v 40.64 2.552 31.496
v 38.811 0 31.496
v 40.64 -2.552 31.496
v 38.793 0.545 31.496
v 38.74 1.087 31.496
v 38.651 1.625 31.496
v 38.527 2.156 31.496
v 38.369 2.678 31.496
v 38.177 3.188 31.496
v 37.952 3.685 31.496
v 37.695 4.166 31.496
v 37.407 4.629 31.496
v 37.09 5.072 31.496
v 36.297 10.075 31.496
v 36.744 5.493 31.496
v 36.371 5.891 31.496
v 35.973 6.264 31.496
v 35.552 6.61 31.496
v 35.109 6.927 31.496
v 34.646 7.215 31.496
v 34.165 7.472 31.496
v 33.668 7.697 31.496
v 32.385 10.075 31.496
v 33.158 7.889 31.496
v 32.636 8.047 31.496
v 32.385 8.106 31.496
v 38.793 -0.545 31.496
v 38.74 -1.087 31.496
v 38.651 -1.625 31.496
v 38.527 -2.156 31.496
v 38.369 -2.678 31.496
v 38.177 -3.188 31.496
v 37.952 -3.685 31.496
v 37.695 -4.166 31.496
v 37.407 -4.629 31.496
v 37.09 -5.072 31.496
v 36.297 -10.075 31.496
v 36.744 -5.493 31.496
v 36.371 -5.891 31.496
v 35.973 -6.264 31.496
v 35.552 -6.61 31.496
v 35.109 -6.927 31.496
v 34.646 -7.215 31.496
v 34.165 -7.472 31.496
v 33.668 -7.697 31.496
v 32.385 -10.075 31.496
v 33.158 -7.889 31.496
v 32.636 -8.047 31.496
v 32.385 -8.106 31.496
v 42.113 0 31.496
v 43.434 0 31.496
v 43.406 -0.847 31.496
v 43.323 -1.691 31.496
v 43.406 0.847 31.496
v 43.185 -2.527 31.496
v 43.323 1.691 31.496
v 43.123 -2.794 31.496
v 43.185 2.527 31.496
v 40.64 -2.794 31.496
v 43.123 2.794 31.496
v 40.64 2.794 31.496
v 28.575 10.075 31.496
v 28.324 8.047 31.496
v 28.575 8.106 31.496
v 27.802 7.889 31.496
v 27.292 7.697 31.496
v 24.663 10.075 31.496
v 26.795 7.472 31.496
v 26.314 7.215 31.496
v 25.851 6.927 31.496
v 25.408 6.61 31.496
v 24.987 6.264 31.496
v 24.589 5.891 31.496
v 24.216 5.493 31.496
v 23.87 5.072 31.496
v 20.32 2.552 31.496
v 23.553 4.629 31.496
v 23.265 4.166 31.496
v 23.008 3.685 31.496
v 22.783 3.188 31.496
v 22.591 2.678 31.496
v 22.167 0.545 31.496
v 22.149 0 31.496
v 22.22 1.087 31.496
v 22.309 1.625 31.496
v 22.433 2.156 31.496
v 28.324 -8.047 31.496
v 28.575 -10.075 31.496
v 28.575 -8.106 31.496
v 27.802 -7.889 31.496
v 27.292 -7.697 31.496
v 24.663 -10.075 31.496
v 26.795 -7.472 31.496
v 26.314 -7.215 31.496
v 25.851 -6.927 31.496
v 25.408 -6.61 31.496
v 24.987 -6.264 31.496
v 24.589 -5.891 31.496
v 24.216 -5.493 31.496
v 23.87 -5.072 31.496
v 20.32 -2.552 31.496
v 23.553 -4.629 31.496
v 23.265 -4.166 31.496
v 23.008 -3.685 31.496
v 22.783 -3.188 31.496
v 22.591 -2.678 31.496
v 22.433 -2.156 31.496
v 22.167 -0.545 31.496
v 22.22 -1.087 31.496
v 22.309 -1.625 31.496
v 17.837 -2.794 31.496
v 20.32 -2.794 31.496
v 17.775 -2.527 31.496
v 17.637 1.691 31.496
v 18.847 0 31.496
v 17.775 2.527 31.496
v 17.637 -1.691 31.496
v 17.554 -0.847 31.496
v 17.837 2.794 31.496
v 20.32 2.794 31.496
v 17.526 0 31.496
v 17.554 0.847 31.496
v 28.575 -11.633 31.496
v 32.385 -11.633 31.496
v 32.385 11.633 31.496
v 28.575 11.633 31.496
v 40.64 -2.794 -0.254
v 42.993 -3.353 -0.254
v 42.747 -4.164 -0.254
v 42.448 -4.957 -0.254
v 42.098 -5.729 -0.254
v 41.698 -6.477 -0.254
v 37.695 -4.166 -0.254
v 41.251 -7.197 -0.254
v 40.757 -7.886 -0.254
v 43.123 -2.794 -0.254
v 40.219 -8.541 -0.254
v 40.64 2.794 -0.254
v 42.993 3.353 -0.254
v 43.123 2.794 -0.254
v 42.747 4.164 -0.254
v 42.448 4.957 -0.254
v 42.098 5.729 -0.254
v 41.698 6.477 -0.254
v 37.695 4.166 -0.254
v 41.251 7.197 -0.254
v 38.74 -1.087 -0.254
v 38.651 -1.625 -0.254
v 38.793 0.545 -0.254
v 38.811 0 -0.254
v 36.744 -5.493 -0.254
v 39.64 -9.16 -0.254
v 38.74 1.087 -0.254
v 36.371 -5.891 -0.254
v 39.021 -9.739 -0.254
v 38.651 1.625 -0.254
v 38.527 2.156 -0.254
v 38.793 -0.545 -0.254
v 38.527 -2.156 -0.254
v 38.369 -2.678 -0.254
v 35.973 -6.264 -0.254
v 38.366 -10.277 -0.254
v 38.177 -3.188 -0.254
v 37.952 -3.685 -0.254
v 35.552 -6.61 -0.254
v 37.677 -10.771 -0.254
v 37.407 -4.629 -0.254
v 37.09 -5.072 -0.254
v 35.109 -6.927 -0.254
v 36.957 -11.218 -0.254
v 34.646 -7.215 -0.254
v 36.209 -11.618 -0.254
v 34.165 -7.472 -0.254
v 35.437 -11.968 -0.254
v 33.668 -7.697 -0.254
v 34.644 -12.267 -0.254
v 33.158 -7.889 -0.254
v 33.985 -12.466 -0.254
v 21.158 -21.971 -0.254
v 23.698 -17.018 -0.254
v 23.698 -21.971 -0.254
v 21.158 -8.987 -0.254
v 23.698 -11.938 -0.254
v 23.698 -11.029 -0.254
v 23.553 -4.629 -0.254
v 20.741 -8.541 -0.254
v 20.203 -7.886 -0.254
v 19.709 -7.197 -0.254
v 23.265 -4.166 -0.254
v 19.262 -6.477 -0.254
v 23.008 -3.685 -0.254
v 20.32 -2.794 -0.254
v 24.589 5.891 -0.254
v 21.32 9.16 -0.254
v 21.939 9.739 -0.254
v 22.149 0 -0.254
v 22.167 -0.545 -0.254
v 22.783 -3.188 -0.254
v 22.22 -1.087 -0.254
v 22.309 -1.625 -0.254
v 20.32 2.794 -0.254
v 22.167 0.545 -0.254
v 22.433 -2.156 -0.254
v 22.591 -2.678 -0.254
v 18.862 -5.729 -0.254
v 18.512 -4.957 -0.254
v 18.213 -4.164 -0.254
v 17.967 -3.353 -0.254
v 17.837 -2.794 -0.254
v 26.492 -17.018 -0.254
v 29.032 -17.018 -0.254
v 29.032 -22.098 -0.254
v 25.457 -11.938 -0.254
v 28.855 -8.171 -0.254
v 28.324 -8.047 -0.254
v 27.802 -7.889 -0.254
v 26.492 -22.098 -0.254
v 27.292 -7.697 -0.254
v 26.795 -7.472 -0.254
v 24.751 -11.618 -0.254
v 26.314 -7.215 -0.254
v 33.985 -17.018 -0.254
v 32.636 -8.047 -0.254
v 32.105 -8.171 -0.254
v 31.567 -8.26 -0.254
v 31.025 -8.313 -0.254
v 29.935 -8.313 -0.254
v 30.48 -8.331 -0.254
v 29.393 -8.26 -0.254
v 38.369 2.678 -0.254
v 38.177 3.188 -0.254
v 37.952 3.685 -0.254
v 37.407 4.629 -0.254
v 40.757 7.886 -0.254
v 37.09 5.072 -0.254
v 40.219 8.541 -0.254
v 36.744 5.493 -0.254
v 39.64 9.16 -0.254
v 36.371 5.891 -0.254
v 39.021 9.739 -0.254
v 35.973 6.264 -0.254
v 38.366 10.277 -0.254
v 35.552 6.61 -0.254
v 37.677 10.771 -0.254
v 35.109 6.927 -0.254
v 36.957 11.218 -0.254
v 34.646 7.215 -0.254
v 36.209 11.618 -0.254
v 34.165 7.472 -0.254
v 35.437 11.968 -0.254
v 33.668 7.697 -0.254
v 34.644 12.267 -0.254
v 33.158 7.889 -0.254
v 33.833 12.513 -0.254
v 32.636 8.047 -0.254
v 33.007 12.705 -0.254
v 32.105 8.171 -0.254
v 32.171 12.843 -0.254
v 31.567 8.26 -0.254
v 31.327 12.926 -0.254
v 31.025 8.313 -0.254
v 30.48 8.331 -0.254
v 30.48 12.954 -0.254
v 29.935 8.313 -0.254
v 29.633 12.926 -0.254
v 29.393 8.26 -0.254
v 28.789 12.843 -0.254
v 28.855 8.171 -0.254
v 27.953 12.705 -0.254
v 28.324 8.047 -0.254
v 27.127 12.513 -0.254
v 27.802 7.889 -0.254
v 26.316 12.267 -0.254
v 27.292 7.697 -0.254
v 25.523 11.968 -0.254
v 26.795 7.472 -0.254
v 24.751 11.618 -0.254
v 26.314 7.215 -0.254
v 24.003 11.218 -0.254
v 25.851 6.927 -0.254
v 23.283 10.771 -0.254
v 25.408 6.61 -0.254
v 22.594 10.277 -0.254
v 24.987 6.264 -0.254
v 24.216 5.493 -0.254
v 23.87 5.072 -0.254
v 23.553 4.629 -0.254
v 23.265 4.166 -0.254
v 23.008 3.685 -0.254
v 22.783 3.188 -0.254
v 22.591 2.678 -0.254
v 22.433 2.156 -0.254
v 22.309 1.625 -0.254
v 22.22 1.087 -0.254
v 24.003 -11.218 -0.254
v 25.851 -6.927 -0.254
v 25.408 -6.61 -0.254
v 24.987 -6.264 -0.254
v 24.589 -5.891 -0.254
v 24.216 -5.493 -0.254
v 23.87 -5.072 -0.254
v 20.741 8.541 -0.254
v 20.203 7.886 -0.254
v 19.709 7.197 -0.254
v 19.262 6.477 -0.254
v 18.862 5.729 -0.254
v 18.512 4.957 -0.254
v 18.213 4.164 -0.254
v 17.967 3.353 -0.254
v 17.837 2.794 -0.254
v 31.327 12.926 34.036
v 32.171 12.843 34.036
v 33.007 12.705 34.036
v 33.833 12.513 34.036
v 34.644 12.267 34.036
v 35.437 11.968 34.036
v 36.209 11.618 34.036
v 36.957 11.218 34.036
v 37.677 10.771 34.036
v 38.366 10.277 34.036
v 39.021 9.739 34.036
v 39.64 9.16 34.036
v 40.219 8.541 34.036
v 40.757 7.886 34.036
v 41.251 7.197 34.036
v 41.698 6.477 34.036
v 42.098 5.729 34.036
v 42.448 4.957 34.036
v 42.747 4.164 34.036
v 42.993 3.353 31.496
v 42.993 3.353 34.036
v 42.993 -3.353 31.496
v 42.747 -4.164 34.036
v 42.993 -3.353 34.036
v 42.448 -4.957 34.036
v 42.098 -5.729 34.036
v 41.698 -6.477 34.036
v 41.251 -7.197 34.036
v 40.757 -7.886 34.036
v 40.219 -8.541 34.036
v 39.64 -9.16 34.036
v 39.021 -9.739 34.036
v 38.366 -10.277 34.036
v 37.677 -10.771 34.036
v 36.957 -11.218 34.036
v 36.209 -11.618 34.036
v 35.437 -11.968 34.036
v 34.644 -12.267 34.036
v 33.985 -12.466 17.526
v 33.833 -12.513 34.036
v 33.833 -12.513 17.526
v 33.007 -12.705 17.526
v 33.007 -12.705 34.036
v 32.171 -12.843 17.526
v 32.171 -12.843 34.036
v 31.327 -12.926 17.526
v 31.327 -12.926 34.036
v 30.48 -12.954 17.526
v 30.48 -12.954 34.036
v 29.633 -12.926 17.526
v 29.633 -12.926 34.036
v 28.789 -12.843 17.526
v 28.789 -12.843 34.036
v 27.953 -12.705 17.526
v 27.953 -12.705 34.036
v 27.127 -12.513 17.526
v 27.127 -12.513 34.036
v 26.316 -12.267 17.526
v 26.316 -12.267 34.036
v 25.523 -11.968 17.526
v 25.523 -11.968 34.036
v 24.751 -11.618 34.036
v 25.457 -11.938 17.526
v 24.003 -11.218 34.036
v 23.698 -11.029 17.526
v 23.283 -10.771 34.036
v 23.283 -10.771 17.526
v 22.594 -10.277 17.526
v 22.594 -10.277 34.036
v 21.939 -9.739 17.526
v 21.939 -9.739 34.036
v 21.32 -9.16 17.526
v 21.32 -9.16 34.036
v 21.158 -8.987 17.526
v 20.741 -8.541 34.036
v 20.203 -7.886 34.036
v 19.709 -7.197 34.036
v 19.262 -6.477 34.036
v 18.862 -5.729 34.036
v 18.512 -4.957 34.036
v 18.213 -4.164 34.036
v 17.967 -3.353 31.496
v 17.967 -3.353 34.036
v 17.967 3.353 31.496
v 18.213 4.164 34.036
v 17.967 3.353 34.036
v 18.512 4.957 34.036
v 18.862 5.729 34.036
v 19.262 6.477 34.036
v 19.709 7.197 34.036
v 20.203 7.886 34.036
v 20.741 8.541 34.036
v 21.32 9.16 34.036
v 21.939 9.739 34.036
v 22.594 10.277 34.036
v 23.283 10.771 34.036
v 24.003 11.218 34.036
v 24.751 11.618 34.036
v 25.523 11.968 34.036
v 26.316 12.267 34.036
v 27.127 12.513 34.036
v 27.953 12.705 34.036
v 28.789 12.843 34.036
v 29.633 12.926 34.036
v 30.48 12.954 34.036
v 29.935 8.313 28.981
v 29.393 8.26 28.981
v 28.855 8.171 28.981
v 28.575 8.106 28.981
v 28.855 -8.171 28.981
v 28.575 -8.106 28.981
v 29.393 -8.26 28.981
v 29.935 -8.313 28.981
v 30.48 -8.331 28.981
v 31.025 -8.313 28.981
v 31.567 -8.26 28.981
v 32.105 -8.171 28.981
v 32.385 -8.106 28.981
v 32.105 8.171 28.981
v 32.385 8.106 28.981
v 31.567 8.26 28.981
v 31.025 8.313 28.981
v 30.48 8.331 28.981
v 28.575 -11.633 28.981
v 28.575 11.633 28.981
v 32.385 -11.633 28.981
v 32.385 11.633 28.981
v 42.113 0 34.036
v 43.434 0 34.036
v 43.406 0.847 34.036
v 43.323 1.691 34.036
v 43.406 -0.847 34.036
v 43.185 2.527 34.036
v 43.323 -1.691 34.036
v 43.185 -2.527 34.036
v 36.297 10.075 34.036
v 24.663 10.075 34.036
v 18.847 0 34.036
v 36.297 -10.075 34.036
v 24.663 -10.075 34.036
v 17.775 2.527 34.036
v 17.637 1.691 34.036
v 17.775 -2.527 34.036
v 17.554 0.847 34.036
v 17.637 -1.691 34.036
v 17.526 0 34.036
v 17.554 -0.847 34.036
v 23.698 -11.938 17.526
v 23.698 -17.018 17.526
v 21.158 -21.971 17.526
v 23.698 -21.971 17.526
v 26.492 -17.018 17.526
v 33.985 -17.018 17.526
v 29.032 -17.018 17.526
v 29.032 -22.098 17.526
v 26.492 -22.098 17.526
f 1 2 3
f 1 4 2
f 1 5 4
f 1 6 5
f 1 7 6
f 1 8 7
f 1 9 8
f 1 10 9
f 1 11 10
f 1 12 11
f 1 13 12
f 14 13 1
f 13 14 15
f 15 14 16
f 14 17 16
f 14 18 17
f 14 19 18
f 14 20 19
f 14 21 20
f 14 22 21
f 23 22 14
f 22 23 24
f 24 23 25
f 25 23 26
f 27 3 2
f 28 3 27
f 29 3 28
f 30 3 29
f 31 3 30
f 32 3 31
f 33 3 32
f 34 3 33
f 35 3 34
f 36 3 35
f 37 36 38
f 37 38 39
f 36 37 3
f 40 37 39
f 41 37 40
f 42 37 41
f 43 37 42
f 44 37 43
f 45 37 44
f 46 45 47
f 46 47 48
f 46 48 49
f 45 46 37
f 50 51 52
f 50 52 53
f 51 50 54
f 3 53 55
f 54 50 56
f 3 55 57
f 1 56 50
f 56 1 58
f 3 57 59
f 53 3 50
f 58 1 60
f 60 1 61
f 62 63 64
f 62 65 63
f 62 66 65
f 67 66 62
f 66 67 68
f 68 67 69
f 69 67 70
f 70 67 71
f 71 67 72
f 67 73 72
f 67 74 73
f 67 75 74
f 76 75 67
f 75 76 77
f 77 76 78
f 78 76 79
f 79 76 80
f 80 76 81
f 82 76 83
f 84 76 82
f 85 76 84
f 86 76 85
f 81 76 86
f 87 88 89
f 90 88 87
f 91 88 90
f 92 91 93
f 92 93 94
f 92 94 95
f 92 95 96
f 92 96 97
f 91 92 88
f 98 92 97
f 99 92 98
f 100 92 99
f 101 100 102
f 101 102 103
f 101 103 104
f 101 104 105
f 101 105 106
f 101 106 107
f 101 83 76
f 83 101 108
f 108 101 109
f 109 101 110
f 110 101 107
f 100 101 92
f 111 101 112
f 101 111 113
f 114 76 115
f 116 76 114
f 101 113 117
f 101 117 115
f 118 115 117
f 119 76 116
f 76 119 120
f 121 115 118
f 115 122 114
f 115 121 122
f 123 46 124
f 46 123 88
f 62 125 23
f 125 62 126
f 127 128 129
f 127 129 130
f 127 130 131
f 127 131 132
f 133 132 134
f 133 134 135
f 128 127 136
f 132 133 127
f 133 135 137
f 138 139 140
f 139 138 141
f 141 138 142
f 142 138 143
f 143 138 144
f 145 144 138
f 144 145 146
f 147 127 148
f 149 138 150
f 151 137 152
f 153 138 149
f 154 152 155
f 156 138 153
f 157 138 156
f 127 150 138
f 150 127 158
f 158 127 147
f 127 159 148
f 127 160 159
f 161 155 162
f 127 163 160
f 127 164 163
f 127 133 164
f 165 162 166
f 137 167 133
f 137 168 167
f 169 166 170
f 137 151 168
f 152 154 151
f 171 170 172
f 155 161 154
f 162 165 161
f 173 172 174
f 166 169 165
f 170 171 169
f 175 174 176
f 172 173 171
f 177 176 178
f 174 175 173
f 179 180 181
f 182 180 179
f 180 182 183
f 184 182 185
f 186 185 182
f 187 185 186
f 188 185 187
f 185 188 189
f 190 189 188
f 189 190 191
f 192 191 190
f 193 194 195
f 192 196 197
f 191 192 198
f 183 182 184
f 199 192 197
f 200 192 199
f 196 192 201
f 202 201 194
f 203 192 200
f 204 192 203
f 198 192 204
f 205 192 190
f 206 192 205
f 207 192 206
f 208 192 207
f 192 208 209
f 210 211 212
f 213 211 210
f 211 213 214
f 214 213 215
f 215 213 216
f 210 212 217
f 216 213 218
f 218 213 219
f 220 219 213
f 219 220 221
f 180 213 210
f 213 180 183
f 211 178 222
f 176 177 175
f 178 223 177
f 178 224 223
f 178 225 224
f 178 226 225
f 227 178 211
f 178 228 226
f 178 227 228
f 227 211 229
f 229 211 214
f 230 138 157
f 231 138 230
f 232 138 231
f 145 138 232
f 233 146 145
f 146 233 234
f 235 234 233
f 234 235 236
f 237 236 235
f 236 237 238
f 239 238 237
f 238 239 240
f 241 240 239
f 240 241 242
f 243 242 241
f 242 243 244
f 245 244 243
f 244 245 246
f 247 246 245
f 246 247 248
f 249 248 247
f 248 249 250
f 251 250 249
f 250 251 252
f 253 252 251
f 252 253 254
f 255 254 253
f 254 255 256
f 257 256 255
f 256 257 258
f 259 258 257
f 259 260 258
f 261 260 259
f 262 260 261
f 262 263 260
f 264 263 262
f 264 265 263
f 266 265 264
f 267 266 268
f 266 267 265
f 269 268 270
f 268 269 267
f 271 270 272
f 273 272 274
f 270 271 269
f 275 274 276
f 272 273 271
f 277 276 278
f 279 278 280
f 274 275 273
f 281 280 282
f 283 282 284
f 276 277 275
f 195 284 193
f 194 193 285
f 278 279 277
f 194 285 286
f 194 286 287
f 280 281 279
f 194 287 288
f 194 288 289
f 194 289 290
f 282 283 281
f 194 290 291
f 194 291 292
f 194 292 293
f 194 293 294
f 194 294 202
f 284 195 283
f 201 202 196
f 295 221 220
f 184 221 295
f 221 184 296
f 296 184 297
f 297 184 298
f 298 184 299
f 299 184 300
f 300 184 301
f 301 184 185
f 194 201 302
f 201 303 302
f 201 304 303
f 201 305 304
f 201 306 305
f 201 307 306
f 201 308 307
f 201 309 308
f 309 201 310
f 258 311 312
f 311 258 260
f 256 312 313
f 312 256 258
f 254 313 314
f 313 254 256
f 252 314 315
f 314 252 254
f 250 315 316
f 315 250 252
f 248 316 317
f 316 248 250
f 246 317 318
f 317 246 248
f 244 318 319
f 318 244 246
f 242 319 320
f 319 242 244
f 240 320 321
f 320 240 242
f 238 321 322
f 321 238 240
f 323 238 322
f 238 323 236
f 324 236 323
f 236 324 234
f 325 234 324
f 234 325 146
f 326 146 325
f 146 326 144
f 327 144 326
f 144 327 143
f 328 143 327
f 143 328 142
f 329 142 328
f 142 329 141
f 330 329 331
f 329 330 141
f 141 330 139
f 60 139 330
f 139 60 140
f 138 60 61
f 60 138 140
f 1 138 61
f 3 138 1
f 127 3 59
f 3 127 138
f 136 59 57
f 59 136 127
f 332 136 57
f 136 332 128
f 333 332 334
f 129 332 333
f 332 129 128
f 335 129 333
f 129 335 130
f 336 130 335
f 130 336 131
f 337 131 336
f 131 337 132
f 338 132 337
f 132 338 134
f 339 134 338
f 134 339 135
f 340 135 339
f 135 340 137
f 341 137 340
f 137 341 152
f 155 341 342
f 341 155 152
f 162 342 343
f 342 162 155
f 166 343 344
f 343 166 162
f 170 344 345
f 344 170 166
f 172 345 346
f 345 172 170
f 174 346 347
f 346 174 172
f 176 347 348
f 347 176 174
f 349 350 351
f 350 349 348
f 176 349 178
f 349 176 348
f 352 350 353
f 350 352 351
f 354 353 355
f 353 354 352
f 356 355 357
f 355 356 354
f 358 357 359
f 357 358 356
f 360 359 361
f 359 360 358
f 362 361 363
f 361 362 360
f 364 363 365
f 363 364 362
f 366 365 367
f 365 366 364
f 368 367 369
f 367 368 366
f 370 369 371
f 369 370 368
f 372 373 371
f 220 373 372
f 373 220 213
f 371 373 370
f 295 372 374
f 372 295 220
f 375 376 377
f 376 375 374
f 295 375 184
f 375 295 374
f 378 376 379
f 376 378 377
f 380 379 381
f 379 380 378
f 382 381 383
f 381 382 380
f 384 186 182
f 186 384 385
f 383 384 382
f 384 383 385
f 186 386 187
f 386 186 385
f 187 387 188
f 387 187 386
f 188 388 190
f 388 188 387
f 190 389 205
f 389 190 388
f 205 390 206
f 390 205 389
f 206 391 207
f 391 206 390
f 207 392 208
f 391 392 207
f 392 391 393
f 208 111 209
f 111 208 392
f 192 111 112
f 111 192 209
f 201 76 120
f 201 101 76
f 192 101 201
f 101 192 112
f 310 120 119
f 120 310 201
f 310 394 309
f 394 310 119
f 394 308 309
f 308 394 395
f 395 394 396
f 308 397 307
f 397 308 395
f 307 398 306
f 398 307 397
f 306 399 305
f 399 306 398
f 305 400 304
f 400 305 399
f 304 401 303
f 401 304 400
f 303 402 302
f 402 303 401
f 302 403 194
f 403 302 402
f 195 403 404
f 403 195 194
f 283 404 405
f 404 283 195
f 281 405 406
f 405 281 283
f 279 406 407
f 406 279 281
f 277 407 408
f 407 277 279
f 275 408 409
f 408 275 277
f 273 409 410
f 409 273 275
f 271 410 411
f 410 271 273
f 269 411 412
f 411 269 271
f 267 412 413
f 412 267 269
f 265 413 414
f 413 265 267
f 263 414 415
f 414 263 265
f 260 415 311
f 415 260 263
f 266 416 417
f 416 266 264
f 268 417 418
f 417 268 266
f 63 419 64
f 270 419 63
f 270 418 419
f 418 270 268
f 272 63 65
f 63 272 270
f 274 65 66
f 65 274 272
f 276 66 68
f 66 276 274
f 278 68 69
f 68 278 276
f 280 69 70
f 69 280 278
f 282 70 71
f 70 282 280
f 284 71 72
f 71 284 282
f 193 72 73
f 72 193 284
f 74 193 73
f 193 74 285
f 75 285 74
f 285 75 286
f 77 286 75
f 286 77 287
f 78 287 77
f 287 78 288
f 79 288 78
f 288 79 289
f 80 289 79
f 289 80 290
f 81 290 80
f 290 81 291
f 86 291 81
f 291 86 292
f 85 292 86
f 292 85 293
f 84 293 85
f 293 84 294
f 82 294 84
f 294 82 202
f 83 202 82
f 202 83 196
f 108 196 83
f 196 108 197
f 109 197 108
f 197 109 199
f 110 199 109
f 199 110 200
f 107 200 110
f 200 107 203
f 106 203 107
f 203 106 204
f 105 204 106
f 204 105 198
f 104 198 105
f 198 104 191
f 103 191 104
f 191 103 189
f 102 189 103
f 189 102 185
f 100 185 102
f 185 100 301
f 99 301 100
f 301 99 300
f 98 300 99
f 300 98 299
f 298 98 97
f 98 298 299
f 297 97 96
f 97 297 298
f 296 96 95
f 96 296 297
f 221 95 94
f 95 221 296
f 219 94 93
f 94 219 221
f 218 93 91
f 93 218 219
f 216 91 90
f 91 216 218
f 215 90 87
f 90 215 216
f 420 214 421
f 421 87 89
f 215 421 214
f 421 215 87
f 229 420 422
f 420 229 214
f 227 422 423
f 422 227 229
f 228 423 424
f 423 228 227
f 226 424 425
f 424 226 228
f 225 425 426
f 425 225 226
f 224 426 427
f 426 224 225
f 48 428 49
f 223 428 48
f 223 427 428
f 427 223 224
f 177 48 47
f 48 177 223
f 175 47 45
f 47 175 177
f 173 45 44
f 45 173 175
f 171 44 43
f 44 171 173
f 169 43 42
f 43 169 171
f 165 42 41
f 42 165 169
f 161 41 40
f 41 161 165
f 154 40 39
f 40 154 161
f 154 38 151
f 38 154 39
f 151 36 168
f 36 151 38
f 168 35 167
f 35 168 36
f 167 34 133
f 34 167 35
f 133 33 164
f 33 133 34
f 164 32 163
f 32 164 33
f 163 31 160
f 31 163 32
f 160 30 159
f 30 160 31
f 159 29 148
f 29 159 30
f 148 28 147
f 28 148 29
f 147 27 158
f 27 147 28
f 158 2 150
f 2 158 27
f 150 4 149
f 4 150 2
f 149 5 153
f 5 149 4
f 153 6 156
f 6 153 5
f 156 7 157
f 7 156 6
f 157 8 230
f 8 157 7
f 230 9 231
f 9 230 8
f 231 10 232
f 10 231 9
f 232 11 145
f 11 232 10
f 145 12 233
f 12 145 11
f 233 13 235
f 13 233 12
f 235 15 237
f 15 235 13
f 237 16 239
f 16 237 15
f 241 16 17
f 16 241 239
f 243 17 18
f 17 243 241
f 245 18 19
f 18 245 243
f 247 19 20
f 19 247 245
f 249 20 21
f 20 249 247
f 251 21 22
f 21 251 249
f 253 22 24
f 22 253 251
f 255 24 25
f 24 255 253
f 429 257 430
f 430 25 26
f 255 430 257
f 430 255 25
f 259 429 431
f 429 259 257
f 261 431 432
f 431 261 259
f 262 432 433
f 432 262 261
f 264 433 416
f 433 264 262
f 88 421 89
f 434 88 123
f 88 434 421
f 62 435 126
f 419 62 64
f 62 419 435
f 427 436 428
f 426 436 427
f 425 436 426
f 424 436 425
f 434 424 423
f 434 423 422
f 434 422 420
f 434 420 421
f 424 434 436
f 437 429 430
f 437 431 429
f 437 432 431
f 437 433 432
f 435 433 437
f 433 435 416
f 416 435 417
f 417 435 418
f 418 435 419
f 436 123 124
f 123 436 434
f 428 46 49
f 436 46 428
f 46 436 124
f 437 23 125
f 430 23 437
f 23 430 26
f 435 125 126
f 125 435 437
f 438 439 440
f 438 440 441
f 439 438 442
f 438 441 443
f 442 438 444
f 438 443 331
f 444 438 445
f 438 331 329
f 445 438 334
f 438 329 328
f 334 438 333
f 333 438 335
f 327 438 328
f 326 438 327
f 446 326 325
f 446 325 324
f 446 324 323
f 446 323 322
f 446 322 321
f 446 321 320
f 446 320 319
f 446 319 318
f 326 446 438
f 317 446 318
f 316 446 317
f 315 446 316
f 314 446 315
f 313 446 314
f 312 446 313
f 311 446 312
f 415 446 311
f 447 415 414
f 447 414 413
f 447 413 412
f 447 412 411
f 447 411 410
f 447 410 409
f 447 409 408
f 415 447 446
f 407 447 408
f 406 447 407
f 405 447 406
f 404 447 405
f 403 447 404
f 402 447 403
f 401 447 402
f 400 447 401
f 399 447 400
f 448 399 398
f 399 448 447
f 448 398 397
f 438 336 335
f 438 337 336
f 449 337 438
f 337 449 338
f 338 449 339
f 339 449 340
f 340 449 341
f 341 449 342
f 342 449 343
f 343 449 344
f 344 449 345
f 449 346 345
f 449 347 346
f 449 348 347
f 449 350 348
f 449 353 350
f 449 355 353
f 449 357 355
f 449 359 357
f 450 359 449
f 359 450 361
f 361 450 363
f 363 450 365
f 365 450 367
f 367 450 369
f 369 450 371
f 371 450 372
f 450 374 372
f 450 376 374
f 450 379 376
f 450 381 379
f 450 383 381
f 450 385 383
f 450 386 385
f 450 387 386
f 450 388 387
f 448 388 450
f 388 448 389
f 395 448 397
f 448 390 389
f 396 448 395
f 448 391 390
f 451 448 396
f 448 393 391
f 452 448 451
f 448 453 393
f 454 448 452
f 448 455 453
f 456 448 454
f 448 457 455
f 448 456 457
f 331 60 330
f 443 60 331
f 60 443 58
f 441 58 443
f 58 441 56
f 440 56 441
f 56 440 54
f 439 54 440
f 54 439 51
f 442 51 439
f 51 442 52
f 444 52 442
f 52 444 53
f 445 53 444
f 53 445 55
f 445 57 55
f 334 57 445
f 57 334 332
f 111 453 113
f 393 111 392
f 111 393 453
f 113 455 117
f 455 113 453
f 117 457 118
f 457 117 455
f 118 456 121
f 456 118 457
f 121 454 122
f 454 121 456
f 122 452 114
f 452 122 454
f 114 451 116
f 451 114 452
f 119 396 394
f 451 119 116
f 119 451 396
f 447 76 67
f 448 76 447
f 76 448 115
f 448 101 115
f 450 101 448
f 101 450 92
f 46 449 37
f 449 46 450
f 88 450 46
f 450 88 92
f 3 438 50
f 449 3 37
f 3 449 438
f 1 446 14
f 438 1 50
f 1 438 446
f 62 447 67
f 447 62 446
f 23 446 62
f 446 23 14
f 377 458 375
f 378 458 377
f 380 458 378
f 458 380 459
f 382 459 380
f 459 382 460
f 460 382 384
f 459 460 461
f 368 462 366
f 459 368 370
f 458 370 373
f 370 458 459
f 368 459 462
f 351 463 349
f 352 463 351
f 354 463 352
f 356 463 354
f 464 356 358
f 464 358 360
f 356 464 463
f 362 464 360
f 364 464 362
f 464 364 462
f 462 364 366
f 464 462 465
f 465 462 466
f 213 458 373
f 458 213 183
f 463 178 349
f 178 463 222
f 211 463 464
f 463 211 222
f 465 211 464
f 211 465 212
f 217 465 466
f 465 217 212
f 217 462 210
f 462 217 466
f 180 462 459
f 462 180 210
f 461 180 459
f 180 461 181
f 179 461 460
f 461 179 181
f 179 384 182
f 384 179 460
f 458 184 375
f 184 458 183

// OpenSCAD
ViewScale = [0.0254, 0.0254, 0.0254];

MountD = 1020;
MountR = MountD/2;
//LedD = 793;
LedD = 916;
LedR = LedD/2;
LensD = 680;
LensR = LensD/2;

module ledMount(ext)
{
    linear_extrude(100)
    difference() {
        circle(MountR, $fn=96);
        circle(LedR, $fn=6);
    }
    translate([0, 0, 100])
    difference()
    {
    linear_extrude(250+ext)
    difference() {
        circle(MountR, $fn=96);
        circle(LedR-130, $fn=96);
        translate([MountR, 0, 0]) square(220, center=true);
        translate([-MountR, 0, 0]) square(220, center=true);
    }
    translate([0, 0, -1])
    linear_extrude(100)
    square([150, LedD], center=true);
    }

    translate([0, 0, 650])
    linear_extrude(700)
    translate([-212, MountR, 0]) 
    {
    translate([105, 140, 0])
    square([100, 440], center=true);
    translate([-105, 90, 0])
    square([100, 530], center=true);
    translate([100, 60, 0])
    square([500, 200], center=true);
    }
}

module lensMount()
{
    linear_extrude(50)
    difference() {
        circle(MountR, $fn=96);
        circle(LensR, $fn=96);
    }
    translate([0, 0, 50])
    linear_extrude(40)
    {
    difference() {
        circle(MountR, $fn=96);
        circle(LensR-20, $fn=96);
    }
    }
    // tab
    translate([0, 0, -240])
    linear_extrude(240)
    translate([MountR-40, 0, 0])
    square([100, 210], center=true);

    // tab
    translate([0, 0, -240])
    linear_extrude(240)
    translate([-MountR+40, 0, 0])
    square([100, 210], center=true);
}

scale(ViewScale)
{
//    translate([0, 0, 340+500])
//    rotate([180, 0, 0])
//    ledMount(500);

    translate([1200, 0, 340+1000])
    rotate([180, 0, 0])
    ledMount(1000);

//    translate([0, 1500, 90])
//    rotate([180, 0, 0])
//    lensMount();
}
